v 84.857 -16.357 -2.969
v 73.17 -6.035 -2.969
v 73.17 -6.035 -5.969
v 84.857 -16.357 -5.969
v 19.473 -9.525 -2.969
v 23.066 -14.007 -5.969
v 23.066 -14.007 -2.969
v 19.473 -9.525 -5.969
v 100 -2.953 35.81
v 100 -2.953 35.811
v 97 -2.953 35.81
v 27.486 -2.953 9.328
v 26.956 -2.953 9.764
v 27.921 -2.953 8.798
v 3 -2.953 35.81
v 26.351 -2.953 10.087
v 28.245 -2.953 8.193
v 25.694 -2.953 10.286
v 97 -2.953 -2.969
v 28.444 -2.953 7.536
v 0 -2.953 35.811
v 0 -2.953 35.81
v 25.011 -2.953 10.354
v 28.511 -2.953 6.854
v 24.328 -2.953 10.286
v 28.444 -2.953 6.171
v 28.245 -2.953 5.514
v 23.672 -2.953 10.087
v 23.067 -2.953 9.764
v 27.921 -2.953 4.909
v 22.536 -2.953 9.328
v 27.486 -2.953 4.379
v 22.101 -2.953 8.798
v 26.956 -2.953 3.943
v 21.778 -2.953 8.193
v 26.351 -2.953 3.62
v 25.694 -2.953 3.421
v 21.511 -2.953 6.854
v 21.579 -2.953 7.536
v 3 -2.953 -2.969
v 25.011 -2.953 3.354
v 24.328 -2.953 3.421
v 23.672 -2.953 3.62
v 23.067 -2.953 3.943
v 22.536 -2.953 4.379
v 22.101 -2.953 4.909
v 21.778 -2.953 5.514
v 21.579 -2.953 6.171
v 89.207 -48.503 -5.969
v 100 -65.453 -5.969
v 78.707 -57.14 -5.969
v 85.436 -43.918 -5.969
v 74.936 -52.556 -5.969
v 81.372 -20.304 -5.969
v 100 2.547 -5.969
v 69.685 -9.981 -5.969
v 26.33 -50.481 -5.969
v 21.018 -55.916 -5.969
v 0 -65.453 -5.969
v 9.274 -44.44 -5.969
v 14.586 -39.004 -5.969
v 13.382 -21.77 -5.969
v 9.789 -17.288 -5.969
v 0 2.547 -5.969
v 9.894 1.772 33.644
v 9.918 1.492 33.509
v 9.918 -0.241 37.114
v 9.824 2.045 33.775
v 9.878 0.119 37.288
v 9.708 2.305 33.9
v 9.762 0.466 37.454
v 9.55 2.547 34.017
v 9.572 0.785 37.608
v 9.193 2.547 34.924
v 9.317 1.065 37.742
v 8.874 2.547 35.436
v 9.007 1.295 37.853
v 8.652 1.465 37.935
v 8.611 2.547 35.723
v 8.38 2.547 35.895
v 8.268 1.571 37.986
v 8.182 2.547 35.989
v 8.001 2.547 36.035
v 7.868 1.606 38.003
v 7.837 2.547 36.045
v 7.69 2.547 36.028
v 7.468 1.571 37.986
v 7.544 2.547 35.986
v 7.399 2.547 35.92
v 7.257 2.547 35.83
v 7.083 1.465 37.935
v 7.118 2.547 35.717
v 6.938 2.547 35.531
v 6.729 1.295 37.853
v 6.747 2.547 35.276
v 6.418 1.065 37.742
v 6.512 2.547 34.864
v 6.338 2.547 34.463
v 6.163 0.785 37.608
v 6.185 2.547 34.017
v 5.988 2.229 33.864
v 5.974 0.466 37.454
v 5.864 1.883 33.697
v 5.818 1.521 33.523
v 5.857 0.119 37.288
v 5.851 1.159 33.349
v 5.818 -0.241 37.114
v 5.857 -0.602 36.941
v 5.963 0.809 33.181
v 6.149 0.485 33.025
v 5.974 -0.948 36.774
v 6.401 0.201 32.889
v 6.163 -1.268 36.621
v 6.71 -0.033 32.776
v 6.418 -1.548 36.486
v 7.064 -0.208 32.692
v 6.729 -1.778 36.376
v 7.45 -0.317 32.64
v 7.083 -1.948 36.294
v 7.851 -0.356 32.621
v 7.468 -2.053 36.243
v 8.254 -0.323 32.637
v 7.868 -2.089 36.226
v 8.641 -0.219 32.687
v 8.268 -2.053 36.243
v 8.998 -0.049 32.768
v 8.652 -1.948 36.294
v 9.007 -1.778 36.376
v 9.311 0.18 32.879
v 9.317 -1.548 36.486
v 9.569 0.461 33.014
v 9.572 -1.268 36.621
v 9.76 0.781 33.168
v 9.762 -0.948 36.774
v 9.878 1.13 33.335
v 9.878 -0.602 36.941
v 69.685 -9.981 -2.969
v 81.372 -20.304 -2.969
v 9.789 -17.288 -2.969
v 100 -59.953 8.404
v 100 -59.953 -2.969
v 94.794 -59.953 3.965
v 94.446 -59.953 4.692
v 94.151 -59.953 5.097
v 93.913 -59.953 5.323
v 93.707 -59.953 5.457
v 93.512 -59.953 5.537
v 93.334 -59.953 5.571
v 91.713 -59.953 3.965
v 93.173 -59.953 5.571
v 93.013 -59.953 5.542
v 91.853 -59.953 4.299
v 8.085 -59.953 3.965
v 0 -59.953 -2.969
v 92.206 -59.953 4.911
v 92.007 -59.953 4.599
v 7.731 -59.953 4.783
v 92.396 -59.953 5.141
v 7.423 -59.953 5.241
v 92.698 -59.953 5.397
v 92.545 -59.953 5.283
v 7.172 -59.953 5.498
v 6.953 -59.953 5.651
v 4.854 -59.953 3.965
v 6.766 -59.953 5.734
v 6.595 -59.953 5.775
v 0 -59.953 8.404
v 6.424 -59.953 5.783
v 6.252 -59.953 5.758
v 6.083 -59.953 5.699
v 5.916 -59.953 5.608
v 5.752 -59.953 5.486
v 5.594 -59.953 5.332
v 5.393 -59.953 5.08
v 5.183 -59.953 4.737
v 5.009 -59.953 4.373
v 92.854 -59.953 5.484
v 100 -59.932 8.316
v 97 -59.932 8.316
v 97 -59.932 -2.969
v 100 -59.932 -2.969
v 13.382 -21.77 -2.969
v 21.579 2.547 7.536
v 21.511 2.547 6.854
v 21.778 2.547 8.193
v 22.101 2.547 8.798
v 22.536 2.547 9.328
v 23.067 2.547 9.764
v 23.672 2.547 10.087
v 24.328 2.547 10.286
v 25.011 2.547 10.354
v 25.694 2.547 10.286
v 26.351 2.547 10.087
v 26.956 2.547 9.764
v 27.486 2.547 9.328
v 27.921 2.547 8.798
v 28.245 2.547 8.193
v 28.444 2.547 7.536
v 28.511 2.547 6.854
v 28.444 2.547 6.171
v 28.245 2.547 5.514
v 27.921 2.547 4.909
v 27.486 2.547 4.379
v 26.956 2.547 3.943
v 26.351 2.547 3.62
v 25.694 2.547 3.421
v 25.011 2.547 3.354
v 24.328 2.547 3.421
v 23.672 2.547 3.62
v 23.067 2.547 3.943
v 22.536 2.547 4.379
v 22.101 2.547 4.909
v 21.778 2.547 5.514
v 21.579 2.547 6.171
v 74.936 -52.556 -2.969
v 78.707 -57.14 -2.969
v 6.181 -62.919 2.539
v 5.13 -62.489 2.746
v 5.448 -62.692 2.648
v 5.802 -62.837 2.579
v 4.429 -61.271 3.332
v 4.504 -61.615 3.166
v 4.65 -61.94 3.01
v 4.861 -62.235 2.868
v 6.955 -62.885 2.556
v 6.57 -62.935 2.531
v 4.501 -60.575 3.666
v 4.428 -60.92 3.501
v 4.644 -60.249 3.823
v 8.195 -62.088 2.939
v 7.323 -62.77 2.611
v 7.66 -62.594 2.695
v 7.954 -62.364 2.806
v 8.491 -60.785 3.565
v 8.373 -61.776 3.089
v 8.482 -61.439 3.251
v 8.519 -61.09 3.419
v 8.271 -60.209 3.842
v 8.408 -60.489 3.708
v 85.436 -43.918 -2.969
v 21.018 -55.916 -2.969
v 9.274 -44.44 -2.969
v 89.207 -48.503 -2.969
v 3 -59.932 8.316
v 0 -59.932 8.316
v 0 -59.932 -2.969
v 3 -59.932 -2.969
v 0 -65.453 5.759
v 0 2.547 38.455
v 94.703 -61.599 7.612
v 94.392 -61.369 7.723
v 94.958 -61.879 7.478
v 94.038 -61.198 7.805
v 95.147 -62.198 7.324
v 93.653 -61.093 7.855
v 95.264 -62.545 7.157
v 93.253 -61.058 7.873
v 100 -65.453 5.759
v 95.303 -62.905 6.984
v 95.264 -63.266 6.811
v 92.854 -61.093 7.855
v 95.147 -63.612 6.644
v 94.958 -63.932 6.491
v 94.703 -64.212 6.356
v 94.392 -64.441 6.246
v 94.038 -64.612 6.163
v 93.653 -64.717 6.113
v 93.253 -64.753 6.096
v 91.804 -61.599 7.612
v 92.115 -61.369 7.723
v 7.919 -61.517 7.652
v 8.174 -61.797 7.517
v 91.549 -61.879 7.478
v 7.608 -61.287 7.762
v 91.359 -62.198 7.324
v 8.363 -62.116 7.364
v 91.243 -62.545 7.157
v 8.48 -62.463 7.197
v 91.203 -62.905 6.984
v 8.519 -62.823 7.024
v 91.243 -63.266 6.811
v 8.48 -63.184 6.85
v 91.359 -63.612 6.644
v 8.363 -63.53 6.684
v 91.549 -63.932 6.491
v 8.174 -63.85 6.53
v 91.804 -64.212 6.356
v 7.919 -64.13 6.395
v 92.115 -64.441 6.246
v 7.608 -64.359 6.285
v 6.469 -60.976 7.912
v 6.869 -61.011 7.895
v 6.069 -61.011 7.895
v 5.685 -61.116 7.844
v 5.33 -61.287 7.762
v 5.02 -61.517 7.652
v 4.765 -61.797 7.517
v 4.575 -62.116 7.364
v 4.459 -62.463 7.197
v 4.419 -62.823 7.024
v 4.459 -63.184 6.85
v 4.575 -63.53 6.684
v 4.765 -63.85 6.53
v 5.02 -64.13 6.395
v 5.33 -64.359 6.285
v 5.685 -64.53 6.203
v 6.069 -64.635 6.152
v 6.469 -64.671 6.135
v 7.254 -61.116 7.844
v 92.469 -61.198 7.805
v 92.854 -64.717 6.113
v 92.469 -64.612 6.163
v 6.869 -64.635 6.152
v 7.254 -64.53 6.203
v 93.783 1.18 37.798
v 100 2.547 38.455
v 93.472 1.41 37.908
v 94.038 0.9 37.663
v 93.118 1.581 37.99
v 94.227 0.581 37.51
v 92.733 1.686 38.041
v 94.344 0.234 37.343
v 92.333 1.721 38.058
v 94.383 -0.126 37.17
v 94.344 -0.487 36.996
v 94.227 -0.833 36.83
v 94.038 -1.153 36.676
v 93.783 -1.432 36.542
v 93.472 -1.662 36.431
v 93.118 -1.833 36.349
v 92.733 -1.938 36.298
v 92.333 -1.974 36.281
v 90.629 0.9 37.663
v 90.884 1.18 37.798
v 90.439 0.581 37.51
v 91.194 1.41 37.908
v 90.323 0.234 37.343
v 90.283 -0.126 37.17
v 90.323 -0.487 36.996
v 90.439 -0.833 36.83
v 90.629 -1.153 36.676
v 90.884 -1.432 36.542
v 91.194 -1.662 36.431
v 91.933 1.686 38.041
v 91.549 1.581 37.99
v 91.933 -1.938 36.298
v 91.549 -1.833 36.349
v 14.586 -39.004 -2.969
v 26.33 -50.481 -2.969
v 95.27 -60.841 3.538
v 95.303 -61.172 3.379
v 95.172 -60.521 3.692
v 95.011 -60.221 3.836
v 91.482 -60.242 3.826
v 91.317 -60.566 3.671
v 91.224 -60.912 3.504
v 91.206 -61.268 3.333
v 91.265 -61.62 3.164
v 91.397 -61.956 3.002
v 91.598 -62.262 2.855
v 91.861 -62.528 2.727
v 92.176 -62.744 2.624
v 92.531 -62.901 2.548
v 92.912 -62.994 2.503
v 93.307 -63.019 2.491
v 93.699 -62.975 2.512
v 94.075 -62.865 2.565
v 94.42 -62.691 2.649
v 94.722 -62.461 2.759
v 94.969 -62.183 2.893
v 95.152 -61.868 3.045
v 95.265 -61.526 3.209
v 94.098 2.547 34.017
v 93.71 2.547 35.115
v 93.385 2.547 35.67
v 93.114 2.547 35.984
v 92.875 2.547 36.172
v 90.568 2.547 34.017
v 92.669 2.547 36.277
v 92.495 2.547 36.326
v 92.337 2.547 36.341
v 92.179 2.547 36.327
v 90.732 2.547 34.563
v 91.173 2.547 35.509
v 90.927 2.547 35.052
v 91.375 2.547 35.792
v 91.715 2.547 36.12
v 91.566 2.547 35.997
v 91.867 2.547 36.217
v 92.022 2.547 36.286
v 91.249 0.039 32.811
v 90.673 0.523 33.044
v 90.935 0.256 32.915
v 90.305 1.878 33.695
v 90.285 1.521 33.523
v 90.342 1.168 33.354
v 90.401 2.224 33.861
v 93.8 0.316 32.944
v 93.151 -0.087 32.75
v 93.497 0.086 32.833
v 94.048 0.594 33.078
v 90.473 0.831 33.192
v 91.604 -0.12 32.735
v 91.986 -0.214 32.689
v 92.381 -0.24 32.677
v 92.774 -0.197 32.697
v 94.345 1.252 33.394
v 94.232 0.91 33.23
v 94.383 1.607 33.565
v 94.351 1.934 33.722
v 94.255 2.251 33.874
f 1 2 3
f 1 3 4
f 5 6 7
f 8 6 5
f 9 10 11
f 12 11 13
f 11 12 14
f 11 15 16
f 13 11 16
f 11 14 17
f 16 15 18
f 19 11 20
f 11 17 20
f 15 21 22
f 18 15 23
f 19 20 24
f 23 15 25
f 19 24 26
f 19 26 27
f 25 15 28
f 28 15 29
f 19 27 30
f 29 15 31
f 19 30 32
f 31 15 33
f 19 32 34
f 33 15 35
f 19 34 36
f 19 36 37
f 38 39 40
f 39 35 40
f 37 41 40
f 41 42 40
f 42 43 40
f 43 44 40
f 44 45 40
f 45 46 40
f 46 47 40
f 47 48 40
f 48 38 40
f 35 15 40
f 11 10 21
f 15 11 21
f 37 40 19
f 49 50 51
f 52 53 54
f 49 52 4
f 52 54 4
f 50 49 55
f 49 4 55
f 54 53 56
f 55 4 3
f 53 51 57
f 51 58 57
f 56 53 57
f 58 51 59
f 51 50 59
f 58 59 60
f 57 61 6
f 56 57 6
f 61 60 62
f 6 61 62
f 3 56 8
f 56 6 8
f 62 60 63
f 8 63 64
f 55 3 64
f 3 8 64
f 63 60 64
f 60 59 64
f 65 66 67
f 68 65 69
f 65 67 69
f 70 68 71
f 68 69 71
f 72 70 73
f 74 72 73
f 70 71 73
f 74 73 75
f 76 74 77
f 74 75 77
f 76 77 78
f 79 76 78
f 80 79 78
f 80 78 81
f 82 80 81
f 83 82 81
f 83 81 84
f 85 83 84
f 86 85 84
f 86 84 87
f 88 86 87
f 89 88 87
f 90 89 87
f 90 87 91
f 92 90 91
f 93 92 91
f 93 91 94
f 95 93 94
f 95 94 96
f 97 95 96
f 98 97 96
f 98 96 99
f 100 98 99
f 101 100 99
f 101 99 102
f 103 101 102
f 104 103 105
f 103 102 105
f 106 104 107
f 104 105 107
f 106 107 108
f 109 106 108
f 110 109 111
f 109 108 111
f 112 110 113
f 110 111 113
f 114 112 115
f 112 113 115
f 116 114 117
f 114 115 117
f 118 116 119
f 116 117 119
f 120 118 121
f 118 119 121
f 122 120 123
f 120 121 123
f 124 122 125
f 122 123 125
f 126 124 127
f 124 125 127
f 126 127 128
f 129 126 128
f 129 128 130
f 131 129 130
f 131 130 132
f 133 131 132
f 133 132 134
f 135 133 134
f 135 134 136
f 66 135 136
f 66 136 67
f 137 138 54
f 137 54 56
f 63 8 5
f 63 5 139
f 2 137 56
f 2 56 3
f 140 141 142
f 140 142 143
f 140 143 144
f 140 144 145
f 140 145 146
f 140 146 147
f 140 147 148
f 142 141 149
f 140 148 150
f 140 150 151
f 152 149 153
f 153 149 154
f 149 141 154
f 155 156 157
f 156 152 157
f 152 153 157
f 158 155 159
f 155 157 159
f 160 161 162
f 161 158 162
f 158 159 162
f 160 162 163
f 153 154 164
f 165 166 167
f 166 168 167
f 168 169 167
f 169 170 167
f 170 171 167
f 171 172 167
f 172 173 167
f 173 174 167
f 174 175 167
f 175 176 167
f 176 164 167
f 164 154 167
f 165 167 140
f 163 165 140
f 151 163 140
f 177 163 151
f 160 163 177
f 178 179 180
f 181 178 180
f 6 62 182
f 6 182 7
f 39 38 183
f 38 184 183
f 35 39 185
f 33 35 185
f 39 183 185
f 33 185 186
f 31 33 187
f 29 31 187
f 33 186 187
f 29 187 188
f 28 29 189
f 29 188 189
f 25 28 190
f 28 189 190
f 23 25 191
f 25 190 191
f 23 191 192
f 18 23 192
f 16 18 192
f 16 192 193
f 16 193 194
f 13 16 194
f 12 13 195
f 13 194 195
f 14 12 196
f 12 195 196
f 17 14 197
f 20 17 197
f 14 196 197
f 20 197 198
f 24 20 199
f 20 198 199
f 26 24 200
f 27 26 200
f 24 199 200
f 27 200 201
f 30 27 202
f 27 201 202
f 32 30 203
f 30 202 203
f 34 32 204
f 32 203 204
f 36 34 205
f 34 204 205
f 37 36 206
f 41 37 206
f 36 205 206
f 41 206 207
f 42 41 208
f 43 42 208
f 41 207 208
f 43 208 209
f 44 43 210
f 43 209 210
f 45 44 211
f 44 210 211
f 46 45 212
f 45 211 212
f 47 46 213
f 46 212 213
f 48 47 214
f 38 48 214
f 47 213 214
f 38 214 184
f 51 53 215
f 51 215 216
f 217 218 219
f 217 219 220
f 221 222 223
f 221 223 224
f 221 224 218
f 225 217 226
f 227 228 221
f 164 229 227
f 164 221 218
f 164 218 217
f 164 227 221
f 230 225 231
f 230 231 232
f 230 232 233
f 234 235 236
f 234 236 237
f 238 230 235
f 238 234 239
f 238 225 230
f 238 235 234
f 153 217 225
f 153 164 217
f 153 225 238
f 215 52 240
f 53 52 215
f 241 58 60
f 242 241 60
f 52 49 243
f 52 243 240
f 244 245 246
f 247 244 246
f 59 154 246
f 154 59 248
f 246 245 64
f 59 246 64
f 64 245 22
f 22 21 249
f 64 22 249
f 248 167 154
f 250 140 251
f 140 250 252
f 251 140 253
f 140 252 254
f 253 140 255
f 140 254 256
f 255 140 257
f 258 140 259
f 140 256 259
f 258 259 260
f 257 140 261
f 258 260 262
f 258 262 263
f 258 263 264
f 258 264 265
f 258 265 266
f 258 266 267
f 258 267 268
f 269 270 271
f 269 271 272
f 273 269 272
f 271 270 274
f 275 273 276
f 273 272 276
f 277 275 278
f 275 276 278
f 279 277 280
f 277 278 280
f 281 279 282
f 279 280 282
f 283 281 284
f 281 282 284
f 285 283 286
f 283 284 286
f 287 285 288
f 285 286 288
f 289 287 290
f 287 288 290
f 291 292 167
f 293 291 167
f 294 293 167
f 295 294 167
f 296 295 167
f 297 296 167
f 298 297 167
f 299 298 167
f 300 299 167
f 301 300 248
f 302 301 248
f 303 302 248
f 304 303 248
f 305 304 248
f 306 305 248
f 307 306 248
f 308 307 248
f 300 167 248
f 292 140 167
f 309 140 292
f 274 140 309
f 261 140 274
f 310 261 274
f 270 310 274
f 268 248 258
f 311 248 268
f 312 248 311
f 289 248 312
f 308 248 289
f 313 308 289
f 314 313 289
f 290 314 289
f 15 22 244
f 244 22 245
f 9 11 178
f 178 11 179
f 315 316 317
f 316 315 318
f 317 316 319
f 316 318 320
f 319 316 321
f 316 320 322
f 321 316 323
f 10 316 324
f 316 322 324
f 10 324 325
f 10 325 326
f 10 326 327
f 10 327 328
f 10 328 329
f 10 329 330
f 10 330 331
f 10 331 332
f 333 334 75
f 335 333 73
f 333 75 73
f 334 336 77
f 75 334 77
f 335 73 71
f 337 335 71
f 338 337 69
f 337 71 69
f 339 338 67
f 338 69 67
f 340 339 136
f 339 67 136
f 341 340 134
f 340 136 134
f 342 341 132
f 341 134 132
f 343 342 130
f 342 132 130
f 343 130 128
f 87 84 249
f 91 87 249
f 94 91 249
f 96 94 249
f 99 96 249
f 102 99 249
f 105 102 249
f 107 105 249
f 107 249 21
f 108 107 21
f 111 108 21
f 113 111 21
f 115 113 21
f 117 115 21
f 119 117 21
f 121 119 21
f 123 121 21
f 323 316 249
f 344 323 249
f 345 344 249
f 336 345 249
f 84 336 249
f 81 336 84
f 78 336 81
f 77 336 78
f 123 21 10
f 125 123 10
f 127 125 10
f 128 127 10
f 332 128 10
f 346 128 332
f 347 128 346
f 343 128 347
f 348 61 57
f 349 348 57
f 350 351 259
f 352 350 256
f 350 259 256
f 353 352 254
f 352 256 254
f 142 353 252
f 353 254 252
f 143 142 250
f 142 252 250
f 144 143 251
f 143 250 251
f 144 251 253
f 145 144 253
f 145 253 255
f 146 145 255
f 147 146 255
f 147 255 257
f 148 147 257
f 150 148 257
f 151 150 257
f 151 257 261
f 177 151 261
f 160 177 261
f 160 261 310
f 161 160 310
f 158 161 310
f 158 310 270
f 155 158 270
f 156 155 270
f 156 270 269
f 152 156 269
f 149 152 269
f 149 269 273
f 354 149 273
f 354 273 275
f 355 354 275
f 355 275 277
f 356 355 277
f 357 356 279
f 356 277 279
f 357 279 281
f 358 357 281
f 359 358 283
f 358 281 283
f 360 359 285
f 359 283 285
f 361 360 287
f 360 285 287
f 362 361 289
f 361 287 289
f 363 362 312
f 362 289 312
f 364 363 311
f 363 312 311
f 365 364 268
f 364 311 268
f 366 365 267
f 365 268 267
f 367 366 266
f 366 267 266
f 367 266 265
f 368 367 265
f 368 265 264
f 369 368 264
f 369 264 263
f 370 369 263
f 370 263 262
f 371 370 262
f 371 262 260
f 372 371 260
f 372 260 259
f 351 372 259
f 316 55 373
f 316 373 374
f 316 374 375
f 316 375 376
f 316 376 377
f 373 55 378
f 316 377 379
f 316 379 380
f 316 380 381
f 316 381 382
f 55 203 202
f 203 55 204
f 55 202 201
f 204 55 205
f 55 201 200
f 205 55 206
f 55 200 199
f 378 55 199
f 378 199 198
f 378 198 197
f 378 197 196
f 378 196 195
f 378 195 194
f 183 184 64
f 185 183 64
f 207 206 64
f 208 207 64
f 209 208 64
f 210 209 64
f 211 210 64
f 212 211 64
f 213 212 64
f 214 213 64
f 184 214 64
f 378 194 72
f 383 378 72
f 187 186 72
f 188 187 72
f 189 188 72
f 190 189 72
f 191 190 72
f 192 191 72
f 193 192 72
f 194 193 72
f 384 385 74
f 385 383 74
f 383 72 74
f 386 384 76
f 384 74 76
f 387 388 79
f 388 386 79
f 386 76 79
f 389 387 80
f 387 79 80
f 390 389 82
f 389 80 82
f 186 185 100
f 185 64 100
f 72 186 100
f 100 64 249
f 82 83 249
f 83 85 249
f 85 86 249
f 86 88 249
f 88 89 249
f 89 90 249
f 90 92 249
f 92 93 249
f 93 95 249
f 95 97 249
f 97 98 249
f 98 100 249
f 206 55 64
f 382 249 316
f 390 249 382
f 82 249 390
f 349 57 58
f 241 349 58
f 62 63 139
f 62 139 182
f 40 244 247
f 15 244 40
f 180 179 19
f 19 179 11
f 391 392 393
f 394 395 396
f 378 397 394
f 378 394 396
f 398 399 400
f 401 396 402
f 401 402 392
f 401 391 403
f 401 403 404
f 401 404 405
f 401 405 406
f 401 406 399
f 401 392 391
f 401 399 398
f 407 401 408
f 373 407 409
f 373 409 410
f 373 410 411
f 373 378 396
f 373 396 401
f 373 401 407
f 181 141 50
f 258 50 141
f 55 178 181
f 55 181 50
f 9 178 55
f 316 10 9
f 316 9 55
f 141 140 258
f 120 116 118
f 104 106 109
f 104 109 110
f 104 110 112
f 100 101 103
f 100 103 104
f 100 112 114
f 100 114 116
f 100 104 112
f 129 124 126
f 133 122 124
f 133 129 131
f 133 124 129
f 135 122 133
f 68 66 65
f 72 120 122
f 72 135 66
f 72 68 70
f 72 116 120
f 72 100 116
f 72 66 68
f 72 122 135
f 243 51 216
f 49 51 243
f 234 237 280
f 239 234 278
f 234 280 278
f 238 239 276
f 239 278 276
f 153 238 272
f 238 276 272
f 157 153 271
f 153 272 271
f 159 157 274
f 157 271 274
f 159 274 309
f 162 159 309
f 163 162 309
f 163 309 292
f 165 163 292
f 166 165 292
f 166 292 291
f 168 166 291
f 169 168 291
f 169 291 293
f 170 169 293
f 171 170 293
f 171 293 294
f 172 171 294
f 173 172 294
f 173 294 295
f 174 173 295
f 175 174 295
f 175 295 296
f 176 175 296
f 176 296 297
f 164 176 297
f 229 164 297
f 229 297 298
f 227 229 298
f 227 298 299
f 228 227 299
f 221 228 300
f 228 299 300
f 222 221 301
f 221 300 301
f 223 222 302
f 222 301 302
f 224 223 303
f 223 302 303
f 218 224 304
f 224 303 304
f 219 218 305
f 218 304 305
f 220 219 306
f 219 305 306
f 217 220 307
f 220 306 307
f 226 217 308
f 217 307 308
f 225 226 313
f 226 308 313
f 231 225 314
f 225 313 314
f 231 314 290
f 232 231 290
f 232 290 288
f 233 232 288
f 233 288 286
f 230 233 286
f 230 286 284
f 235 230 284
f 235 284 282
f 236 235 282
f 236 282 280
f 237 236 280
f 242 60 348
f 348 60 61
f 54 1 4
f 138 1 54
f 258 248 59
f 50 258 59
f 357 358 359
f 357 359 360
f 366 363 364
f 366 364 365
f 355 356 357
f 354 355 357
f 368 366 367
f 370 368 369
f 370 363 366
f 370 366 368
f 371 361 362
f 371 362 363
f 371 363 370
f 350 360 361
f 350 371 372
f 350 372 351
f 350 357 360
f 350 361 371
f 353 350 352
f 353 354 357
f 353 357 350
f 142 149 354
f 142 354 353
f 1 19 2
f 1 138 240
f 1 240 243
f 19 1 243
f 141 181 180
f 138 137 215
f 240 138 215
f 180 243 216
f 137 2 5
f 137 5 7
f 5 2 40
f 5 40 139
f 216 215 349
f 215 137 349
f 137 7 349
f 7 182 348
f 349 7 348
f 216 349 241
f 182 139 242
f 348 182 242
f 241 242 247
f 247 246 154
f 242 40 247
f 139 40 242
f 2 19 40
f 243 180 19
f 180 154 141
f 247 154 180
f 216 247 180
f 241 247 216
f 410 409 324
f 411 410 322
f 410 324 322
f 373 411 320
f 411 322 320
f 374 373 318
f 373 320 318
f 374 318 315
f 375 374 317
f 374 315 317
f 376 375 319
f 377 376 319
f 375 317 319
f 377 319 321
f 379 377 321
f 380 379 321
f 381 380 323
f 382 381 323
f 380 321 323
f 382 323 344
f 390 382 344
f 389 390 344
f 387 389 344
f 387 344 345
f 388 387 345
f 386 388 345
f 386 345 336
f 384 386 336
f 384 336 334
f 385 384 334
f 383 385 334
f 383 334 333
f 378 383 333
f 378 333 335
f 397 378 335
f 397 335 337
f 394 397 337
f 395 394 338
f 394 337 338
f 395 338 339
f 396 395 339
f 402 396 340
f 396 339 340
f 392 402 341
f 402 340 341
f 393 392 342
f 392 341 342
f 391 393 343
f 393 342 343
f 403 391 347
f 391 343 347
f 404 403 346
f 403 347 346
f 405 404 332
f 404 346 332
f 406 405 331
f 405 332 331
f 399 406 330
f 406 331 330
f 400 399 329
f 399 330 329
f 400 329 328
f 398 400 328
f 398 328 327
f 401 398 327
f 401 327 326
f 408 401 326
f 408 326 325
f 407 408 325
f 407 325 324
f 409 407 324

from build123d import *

# Parameters (mm, degrees)
EXTRUDE006_DEPTH                          = 7.5
SKETCH004_R                               = 3.5
EXTRUDE005_DEPTH                          = 10
SKETCH003_AS_DRAWN_R                      = 2.05
EXTRUDE004_DEPTH                          = 4
EXTRUDE004_ONTO_SKETCH003_PLACEMENT_ANGLE = 25.679232
SKETCH002_AS_DRAWN_R                      = 2.05
EXTRUDE003_DEPTH                          = 4
EXTRUDE003_ONTO_SKETCH002_PLACEMENT_ANGLE = 25.679232
EXTRUDE002_DEPTH                          = 3
EXTRUDE001_DEPTH                          = 3
EXTRUDE_DEPTH                             = 100


with BuildPart() as extrude006:
    # Sketch005 (on Face9 of Cut002) → Extrude006 (new body, symmetric)
    with BuildSketch(Plane.XY.offset(-2.969462)):
        Polygon((9.788822, -17.287546), (13.381697, -21.769908), (23.066011, -14.007366), (19.473136, -9.525003), align=None)
        Polygon((74.935691, -52.555563), (78.706554, -57.139857), (89.207015, -48.502584), (85.436152, -43.91829), align=None)
        Polygon((9.274179, -44.439739), (14.585862, -39.004322), (26.329694, -50.48081), (21.018012, -55.916228), align=None)
        Polygon((69.684992, -9.981081), (73.170384, -6.034964), (84.857305, -16.35739), (81.371913, -20.303507), align=None)
    extrude(amount=EXTRUDE006_DEPTH, both=True)


with BuildPart() as extrude005:
    # Sketch004 (on Face13 of Cut001) → Extrude005 (new body, symmetric)
    with BuildSketch(Plane(origin=(0, 2.547184, 0), x_dir=(-1, 0, 0), z_dir=(0, 1, 0))):
        with Locations((-25.011261, 6.853597)):
            Circle(SKETCH004_R)
    extrude(amount=EXTRUDE005_DEPTH, both=True)


with BuildPart() as extrude004:
    # Sketch003 as drawn → Extrude004 (new)
    with BuildSketch(Plane.XY):
        with Locations((6.469403, -53.574993)):
            Circle(SKETCH003_AS_DRAWN_R)
        with Locations((93.253448, -53.665895)):
            Circle(SKETCH003_AS_DRAWN_R)
    extrude(amount=-EXTRUDE004_DEPTH)


with BuildPart() as extrude004_1:
    # Extrude004 onto Sketch003 placement: moved
    add(extrude004.part.moved(Location((0, -14.53972, 30.239351))).rotate(Axis((0, -14.53972, 30.239351), (1, 0, 0)), EXTRUDE004_ONTO_SKETCH003_PLACEMENT_ANGLE))


with BuildPart() as extrude003:
    # Sketch002 as drawn → Extrude003 (new)
    with BuildSketch(Plane.XY):
        with Locations((7.867664, 15.865227)):
            Circle(SKETCH002_AS_DRAWN_R)
        with Locations((92.333176, 15.993219)):
            Circle(SKETCH002_AS_DRAWN_R)
    extrude(amount=-EXTRUDE003_DEPTH)


with BuildPart() as extrude003_1:
    # Extrude003 onto Sketch002 placement: moved
    add(extrude003.part.moved(Location((0, -14.53972, 30.239351))).rotate(Axis((0, -14.53972, 30.239351), (1, 0, 0)), EXTRUDE003_ONTO_SKETCH002_PLACEMENT_ANGLE))


with BuildPart() as extrude002:
    # Sketch001 → Extrude002 (new body)
    with BuildSketch(Plane.YZ):
        Polygon((-59.93153, 8.316114), (-59.93153, -2.969465), (-2.952637, -2.969465), (-2.952637, 35.810581), align=None)
    extrude(amount=EXTRUDE002_DEPTH)


with BuildPart() as extrude002_1:
    # Extrude002 placement: moved
    add(extrude002.part.moved(Location((97, 0, 0))))


with BuildPart() as extrude001:
    # Sketch001 → Extrude001 (new body)
    with BuildSketch(Plane.YZ):
        Polygon((-59.93153, 8.316114), (-59.93153, -2.969465), (-2.952637, -2.969465), (-2.952637, 35.810581), align=None)
    extrude(amount=EXTRUDE001_DEPTH)


with BuildPart() as caja:
    # Sketch → Extrude (new body)
    with BuildSketch(Plane.YZ):
        Polygon((-65.452816, 5.759257), (-65.452816, -5.969462), (2.547184, -5.969462), (2.547184, 38.455096), (-2.952816, 35.81058), (-2.952816, -2.969462), (-59.952816, -2.969462), (-59.952816, 8.403773), align=None)
    extrude(amount=EXTRUDE_DEPTH)

    # Fusion: union Extrude002, Extrude001
    add(extrude002_1.part)
    add(extrude001.part)

    # Cut: cut Extrude003
    add(extrude003_1.part, mode=Mode.SUBTRACT)

    # Cut001: cut Extrude004
    add(extrude004_1.part, mode=Mode.SUBTRACT)

    # Cut002: cut Extrude005
    add(extrude005.part, mode=Mode.SUBTRACT)

    # Cut003: cut Extrude006
    add(extrude006.part, mode=Mode.SUBTRACT)


solid = caja.part
